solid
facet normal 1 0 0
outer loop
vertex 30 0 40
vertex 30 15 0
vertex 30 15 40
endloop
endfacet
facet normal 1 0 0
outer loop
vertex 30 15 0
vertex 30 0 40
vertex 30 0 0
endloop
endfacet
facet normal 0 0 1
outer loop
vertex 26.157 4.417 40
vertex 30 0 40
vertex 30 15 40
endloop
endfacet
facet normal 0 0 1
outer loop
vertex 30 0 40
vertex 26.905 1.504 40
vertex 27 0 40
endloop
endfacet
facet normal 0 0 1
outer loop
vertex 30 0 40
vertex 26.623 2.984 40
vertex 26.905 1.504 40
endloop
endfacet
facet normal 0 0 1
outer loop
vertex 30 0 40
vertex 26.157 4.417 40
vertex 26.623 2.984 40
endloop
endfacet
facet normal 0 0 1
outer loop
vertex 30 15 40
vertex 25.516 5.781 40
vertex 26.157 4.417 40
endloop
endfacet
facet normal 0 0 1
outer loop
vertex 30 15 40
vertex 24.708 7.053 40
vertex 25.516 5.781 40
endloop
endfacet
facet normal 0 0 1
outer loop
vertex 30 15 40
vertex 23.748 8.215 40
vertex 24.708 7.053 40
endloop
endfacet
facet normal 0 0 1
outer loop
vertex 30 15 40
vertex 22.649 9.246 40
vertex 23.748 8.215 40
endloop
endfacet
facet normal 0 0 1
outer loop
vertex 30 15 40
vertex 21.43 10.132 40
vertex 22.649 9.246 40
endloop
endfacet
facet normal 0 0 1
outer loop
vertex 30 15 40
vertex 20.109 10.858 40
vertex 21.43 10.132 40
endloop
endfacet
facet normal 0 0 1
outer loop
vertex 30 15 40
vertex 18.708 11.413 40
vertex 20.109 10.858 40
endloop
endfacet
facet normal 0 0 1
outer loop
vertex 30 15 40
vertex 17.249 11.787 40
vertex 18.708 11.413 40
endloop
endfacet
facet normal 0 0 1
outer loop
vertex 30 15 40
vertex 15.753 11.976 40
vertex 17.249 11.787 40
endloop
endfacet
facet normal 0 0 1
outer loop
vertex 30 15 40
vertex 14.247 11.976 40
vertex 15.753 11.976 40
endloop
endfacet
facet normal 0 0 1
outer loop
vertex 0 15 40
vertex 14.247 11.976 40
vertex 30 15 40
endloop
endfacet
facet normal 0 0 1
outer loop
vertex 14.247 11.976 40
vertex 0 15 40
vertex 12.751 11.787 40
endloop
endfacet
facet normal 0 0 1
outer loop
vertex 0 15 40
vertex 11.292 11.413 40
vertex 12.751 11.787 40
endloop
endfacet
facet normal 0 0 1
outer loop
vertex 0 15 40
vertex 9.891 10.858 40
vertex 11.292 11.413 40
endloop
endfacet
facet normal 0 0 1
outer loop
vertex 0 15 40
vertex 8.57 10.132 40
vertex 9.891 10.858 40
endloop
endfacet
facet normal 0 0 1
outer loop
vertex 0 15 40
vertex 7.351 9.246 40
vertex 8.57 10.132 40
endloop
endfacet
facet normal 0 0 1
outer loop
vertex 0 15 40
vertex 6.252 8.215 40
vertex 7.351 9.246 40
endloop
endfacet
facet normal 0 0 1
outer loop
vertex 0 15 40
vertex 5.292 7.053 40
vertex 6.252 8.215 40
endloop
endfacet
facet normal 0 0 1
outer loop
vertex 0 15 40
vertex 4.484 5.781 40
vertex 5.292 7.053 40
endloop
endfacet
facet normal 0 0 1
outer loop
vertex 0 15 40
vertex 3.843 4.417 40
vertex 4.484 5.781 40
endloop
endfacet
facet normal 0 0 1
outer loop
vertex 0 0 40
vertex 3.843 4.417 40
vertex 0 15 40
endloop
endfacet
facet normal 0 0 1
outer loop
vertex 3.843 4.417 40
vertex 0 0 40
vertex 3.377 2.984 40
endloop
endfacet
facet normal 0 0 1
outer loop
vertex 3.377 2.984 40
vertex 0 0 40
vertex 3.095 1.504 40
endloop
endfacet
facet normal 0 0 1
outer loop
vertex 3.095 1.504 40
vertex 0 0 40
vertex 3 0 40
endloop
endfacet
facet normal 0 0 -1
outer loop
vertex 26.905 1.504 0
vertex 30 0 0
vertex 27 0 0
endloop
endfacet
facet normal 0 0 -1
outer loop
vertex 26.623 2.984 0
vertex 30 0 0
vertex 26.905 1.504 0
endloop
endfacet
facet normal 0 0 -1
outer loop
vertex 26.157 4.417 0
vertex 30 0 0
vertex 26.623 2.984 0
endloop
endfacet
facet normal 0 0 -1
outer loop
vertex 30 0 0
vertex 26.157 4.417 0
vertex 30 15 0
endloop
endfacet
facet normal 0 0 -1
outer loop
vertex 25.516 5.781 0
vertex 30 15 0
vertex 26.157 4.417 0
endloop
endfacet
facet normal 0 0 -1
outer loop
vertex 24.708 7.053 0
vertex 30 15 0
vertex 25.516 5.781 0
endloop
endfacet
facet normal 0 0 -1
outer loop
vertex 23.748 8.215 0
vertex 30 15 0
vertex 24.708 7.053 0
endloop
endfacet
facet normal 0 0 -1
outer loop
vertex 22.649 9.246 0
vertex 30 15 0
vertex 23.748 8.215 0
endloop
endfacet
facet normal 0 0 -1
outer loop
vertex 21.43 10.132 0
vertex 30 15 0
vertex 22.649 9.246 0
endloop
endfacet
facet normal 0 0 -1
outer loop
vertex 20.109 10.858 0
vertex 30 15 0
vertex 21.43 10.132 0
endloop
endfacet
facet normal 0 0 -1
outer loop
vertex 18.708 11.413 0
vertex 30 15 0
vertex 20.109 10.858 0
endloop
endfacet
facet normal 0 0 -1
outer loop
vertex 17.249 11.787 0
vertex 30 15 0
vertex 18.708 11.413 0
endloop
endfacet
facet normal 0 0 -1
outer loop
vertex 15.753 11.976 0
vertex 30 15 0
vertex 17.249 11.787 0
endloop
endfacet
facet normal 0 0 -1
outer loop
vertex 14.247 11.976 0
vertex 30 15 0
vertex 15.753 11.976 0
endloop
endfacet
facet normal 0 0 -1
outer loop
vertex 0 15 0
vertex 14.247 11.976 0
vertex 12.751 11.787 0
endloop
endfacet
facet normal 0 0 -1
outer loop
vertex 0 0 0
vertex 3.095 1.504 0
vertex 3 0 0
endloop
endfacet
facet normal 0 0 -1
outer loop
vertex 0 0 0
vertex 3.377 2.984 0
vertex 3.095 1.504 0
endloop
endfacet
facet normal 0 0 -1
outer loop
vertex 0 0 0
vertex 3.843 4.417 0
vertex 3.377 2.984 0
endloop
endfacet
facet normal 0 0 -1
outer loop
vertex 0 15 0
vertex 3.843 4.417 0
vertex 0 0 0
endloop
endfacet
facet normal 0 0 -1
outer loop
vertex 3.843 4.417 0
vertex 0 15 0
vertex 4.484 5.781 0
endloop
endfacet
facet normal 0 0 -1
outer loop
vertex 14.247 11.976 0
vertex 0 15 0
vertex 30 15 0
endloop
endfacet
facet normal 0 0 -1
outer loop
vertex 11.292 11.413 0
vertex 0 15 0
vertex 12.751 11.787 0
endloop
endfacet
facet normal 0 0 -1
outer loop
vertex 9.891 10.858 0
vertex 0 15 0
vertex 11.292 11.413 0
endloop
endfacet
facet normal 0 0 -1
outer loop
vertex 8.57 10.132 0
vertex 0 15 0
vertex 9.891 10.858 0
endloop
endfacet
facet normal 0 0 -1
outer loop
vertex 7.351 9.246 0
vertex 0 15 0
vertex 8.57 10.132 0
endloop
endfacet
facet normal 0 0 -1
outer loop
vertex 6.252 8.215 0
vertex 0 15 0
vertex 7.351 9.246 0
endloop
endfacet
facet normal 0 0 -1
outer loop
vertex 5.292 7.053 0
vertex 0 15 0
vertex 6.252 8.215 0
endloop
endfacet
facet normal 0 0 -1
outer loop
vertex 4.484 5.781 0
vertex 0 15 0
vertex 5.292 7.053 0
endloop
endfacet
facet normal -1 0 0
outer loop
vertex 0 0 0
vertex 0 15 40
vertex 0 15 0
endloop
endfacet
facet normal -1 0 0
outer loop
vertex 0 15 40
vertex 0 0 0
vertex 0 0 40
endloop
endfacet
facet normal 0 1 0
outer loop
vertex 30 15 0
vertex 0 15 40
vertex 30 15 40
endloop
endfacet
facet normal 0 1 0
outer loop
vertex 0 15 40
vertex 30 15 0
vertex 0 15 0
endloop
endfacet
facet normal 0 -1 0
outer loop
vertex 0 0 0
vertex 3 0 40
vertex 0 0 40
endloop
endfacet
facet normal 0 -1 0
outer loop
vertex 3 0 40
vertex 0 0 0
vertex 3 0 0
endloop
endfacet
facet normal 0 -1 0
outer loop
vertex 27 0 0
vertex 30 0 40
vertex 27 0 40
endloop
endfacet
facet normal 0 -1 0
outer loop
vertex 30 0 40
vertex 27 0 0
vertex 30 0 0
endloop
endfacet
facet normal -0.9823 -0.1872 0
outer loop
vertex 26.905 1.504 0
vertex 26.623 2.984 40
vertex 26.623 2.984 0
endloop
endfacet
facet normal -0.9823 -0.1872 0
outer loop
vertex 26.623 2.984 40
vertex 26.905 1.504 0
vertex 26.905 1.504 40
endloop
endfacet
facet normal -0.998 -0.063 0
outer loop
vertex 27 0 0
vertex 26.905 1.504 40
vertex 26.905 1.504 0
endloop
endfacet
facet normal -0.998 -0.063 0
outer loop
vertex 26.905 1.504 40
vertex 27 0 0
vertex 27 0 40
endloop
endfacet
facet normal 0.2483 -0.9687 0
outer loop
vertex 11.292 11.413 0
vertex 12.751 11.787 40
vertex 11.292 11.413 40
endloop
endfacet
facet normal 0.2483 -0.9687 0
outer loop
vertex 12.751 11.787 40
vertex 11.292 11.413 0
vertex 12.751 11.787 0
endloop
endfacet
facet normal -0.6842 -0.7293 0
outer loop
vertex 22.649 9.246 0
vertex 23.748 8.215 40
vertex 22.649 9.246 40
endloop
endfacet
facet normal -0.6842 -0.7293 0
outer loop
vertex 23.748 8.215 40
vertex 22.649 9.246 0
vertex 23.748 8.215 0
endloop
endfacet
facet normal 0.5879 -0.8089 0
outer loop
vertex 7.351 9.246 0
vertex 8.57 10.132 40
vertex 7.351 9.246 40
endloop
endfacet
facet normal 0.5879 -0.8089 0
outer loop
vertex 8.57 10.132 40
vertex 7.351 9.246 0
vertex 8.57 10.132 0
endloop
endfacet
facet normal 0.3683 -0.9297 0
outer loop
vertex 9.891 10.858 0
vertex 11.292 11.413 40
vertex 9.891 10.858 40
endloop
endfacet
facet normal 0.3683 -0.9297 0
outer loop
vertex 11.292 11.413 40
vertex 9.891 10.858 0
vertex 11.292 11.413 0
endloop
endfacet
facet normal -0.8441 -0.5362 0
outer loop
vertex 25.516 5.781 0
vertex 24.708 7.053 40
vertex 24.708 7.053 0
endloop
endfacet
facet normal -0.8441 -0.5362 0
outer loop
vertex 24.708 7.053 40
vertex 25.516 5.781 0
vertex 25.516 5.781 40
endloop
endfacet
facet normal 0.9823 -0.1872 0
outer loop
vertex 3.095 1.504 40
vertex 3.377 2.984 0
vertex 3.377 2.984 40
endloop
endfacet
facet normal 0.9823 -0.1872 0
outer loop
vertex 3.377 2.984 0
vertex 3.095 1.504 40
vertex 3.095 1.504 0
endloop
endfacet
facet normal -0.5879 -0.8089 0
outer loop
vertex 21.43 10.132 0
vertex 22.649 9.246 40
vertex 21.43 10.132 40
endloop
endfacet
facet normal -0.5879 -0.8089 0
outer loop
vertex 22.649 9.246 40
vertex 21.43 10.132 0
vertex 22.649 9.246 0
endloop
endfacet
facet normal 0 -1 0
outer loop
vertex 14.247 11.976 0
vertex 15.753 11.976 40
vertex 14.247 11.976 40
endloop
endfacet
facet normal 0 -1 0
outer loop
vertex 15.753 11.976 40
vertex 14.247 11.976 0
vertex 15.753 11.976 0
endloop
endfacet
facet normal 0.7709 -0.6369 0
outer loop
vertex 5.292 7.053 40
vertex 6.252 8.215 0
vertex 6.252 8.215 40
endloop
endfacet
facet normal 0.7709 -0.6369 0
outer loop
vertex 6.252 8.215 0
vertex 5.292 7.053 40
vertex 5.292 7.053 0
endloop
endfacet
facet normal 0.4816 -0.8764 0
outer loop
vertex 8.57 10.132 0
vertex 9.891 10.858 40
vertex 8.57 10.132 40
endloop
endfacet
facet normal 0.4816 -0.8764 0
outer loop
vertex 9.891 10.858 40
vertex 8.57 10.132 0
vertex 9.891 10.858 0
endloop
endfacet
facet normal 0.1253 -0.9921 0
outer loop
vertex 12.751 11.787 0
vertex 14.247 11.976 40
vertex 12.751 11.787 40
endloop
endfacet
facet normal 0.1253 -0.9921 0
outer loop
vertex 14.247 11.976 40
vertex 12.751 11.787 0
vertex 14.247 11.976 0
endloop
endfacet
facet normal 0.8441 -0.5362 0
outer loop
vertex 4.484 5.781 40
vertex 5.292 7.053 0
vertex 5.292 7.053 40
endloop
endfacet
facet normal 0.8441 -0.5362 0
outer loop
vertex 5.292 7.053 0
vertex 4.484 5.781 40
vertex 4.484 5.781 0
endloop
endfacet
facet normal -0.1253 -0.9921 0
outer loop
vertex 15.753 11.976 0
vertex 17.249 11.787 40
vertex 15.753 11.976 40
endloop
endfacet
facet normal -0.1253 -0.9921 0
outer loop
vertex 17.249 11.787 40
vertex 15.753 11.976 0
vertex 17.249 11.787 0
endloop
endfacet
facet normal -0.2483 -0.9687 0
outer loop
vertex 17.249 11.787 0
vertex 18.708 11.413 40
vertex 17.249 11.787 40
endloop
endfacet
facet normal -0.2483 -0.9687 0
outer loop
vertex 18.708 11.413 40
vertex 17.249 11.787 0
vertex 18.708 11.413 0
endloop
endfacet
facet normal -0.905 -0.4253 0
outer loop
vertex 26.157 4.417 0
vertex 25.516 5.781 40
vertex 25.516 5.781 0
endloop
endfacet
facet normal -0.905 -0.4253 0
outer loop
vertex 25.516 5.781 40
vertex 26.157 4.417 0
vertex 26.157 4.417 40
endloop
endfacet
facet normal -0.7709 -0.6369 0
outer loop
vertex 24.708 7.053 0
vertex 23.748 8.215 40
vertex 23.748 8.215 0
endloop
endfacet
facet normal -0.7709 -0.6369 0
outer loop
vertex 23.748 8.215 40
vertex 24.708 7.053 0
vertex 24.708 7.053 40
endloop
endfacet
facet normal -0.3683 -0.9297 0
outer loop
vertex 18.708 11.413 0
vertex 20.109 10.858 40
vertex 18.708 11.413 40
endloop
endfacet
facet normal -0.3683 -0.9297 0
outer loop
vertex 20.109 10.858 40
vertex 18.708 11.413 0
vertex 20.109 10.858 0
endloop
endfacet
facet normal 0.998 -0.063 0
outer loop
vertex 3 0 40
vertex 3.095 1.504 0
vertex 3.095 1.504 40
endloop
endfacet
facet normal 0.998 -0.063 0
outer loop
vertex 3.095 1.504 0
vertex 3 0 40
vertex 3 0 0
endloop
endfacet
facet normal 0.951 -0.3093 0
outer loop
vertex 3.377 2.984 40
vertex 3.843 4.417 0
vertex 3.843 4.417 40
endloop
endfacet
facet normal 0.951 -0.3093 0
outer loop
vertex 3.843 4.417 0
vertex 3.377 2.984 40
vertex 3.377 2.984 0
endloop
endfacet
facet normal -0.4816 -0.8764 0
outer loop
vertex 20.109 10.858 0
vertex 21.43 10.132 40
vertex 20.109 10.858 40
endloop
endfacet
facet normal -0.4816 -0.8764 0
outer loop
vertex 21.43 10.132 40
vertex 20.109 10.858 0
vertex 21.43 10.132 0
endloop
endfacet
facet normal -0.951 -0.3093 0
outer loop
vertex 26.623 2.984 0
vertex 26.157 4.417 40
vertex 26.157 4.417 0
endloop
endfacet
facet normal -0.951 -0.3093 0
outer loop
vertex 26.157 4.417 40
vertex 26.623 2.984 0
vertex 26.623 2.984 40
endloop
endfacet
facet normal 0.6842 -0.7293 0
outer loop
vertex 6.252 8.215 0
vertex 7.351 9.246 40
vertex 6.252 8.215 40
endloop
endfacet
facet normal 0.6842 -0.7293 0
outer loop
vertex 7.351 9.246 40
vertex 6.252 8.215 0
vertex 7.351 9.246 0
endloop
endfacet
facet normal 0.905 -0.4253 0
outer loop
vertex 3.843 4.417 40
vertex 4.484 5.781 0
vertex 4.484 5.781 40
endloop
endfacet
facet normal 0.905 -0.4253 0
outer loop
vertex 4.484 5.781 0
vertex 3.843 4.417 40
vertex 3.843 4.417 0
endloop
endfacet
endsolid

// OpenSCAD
$fn = 50;

height = 40;
width = 30;
band = 3;

difference() {
    cube([width, width / 2, height]);
    translate([width / 2, 0, -band])
        cylinder(
            h=height + 2 * band, 
            r1=width / 2 - band, 
            r2=width / 2 - band
        );
}
